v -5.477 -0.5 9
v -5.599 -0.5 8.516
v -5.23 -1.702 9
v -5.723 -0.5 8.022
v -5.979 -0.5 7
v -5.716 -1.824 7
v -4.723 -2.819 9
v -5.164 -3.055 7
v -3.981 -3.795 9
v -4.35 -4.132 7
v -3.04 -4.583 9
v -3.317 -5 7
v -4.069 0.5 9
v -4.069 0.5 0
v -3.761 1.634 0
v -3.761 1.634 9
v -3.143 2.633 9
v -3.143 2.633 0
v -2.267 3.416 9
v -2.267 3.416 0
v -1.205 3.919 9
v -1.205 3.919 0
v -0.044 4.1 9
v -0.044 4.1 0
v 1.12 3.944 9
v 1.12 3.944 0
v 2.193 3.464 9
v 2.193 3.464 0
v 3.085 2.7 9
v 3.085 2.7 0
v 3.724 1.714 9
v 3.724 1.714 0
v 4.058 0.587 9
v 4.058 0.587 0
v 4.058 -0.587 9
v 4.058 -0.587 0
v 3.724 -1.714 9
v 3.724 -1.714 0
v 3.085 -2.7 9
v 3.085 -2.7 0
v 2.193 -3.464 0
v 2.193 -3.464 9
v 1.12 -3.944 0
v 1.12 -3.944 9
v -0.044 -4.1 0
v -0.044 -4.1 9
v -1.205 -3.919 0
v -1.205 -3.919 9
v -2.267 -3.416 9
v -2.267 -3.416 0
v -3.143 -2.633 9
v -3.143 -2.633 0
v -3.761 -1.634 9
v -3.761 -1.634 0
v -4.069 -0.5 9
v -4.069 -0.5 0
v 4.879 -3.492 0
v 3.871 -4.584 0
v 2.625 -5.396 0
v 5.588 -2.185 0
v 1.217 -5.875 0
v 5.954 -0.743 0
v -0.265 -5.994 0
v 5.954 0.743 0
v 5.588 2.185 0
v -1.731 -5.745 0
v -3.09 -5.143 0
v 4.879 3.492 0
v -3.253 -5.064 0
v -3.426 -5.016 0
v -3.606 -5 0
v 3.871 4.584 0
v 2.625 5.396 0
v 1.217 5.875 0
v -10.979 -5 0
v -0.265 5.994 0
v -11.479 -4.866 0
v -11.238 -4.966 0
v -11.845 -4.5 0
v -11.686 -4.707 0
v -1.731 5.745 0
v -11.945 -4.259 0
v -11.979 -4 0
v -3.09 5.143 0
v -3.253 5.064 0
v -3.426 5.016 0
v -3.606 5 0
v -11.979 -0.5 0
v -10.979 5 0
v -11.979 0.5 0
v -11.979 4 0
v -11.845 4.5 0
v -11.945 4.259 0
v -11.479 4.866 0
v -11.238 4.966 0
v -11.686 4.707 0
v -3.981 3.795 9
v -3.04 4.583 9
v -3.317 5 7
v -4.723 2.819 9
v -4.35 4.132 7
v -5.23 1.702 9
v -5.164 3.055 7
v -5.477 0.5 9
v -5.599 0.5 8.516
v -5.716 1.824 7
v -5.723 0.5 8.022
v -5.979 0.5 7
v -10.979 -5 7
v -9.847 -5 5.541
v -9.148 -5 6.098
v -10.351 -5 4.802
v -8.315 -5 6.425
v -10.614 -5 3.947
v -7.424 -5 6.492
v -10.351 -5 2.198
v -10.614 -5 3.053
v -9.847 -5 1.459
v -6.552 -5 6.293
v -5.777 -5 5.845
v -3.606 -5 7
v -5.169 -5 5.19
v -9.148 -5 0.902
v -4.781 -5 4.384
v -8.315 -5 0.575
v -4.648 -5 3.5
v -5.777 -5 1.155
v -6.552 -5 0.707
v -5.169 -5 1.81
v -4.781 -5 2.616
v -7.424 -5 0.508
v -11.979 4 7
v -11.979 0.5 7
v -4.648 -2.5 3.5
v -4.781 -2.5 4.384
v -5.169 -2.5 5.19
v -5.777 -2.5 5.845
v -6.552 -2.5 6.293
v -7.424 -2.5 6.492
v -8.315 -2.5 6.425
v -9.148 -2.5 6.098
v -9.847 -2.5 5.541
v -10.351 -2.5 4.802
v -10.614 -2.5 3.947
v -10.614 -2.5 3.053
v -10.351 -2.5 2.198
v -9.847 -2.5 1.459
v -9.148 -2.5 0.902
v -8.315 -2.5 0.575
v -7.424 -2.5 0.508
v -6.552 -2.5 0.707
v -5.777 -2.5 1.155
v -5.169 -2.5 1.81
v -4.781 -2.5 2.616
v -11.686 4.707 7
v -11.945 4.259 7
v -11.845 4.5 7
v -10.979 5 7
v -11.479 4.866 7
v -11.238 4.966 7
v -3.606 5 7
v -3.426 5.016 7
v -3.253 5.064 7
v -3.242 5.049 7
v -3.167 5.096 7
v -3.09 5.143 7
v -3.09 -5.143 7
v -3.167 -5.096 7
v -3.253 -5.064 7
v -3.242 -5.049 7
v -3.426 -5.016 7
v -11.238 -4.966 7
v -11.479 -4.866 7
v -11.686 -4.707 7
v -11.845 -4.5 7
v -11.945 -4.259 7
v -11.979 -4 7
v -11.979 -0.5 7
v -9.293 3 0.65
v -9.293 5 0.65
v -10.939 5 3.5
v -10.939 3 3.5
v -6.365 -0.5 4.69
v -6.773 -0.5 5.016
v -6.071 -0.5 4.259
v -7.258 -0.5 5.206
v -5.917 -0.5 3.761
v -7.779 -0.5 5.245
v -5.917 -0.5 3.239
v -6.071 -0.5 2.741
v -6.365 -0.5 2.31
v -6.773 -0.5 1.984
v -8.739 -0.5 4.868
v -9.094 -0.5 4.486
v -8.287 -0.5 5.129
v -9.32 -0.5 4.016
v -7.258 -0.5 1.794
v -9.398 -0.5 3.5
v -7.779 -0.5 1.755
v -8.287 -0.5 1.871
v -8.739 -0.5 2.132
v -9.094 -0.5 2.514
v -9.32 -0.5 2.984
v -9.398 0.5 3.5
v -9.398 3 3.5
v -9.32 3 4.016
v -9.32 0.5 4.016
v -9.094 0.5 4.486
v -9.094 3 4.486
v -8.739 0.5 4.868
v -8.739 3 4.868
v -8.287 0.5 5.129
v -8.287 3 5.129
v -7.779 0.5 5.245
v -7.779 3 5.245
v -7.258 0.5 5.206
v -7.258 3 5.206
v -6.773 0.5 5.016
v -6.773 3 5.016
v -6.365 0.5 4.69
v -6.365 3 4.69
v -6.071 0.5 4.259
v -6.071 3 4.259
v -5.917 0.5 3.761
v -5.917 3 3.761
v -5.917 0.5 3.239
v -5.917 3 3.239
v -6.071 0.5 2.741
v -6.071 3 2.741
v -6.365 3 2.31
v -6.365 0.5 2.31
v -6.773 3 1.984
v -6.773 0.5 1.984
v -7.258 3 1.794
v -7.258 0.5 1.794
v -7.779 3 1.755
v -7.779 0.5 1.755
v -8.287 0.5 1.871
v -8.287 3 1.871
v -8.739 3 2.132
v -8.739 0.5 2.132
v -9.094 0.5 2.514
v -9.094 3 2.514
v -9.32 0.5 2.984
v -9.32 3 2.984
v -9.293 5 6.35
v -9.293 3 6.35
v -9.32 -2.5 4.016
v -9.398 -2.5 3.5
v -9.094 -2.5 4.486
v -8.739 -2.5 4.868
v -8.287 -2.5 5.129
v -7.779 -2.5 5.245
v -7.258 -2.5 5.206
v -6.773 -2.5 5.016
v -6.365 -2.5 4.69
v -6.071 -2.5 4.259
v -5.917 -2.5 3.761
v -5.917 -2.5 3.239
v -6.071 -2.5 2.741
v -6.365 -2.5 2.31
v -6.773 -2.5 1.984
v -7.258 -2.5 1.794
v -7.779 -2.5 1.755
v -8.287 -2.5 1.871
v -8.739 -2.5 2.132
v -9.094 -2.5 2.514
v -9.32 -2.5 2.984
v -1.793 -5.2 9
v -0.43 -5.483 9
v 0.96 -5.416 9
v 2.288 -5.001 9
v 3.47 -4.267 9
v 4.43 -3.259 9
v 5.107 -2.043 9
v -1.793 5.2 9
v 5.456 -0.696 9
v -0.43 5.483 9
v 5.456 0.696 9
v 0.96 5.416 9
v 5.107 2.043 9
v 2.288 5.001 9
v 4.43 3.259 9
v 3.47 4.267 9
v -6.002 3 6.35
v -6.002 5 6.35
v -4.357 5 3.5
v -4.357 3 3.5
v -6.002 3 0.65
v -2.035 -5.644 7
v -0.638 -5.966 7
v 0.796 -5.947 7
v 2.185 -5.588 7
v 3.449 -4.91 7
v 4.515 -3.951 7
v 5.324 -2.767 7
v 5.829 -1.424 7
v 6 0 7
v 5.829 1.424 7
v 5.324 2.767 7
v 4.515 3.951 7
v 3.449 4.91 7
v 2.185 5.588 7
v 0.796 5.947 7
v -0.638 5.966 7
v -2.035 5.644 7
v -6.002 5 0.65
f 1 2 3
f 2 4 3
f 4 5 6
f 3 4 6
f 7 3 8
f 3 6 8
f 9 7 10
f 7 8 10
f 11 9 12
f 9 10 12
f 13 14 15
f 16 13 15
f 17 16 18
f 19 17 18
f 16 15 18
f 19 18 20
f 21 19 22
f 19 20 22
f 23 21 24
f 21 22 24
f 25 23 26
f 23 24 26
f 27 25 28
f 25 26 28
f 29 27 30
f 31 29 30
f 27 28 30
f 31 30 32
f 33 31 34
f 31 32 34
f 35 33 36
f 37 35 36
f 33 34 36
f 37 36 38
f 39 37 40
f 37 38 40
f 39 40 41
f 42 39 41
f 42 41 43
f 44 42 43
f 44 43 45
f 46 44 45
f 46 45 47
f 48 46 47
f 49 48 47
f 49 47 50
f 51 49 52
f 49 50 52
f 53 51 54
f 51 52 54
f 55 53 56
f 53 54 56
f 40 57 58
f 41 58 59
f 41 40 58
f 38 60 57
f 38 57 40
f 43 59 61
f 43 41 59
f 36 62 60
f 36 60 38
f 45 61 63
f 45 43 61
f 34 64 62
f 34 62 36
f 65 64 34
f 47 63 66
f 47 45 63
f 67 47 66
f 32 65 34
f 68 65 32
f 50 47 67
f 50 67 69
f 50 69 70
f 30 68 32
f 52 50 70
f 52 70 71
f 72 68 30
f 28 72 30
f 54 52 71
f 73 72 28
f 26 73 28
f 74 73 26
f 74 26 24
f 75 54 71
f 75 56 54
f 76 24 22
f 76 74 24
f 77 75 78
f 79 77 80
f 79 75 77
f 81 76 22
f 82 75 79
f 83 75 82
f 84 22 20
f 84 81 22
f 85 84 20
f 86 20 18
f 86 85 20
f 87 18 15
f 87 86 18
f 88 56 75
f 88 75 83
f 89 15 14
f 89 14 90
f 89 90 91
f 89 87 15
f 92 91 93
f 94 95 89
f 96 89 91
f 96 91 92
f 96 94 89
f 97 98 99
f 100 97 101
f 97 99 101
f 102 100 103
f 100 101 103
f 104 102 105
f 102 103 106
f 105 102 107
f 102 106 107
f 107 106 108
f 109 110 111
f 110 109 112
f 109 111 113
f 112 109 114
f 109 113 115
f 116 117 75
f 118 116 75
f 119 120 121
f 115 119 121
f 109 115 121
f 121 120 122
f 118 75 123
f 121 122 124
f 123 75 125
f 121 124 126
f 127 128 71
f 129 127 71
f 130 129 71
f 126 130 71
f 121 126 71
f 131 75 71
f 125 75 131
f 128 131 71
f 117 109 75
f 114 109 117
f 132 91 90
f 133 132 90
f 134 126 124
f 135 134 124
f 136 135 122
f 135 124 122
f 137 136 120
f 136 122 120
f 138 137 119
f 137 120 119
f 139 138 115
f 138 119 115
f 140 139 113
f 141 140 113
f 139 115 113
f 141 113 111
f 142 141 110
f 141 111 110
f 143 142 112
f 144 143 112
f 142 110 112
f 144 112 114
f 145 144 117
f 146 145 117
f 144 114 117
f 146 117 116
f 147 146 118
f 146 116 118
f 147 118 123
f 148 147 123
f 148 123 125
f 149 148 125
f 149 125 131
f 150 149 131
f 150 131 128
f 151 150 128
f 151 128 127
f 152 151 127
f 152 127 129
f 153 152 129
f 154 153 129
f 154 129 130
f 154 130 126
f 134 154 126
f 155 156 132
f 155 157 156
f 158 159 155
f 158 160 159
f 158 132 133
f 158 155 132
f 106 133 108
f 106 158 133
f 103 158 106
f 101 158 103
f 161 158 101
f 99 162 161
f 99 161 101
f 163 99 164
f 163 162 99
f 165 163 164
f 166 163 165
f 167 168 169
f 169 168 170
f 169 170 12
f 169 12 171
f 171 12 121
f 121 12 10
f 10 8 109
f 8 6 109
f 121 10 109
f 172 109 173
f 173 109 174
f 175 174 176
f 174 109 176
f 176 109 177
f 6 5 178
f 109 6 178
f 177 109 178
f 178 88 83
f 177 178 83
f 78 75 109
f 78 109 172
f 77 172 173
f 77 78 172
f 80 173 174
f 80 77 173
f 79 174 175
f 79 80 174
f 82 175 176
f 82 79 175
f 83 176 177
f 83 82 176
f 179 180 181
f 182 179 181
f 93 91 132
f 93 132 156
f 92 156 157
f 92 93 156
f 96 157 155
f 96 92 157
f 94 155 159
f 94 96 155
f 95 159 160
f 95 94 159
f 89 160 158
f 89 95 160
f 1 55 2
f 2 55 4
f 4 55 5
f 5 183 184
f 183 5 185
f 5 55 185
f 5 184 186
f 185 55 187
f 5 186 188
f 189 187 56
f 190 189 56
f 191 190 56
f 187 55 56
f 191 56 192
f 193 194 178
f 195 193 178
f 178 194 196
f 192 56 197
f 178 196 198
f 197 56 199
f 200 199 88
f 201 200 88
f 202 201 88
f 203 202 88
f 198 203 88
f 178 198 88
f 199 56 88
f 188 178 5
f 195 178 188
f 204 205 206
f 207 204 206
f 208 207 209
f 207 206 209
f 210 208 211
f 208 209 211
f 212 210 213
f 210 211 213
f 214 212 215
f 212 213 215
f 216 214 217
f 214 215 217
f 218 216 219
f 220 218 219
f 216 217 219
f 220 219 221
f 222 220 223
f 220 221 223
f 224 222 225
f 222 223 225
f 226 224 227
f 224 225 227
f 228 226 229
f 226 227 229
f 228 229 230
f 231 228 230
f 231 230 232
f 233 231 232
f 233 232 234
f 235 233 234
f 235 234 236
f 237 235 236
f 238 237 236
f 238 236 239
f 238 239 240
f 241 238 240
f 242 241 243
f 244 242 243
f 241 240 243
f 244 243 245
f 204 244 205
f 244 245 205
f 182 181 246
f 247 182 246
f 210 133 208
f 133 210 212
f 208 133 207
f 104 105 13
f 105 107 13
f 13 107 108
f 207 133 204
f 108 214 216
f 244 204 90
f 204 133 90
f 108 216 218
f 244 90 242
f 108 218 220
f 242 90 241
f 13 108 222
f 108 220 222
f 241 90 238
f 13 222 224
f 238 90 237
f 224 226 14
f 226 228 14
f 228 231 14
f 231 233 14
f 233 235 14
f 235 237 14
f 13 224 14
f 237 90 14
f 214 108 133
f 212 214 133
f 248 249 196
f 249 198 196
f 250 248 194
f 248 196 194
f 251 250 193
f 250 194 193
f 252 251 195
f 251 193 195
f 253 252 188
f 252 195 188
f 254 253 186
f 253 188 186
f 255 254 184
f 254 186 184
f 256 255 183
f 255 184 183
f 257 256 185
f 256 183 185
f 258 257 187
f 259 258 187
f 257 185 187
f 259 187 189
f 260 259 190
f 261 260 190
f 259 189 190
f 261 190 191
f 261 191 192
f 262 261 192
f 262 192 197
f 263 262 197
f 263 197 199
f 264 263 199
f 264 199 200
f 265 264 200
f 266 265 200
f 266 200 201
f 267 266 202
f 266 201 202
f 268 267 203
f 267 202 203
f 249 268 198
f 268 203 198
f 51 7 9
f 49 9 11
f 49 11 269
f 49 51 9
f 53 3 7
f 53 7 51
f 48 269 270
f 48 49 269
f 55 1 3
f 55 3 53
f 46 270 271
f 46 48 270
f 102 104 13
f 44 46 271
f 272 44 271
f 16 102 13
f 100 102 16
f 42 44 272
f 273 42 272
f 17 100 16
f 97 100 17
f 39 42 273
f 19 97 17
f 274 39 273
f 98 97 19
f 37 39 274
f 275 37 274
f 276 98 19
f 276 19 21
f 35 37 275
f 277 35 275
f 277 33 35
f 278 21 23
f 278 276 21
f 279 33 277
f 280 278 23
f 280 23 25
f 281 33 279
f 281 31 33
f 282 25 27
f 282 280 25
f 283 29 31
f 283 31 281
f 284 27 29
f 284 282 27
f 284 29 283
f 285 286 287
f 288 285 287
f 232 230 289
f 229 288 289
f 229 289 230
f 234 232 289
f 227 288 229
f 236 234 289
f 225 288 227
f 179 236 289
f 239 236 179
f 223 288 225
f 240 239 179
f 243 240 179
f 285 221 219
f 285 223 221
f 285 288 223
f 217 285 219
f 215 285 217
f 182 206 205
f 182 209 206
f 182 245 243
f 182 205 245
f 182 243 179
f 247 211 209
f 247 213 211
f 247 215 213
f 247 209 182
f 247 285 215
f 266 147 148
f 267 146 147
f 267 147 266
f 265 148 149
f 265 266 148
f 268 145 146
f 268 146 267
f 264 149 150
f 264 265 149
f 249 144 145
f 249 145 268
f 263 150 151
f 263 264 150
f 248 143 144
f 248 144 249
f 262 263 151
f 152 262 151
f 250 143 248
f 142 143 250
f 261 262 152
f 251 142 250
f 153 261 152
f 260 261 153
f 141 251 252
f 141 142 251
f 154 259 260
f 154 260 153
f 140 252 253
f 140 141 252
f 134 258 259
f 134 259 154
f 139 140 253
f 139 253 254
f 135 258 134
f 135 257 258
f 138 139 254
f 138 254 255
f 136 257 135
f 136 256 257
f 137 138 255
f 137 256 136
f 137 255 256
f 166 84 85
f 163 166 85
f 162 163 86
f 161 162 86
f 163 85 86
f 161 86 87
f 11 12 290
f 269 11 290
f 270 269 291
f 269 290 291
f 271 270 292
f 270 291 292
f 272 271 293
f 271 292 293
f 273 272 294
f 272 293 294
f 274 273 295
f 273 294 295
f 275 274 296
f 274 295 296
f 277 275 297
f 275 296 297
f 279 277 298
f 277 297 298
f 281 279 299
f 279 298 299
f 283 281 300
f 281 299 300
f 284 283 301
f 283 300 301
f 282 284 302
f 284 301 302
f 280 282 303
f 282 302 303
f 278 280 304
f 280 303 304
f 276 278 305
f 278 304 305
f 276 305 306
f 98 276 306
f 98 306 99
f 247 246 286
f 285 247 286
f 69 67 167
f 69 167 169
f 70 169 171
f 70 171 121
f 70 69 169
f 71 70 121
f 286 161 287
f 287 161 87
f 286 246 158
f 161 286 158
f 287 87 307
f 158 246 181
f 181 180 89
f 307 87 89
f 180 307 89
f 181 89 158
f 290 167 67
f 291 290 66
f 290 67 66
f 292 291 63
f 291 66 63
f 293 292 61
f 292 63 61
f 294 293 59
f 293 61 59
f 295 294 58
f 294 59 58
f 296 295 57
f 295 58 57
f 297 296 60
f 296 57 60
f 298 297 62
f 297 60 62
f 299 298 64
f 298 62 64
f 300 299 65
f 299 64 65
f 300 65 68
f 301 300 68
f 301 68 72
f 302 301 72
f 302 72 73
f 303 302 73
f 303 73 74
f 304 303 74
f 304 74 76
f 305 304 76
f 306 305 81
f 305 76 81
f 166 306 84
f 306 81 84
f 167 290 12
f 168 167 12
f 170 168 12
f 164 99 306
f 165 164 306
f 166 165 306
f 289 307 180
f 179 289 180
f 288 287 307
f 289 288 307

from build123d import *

# Parameters (mm, degrees)
F1_DEPTH       = 9
F2_DEPTH       = 7
F7_D           = 3.5
F7_START       = 4.5
F7_CBORE_D     = 6
F7_CBORE_DEPTH = 2.5
F8_DEPTH       = 6.5
F9_SIZE2       = 1.99999
F9_SIZE        = 0.49999
F10_T1_DEPTH   = 7
F10_T3_DEPTH   = 7


# Not quite as in the source:
# - a fillet or chamfer that OpenCascade refuses, or shapes differently, is made with other operations: its cross-section is extruded or revolved along the edge and cut away or added
# - a fillet or chamfer is up to 0.001 mm smaller than in the source, because OpenCascade refuses the exact size


with BuildPart() as f1:
    # F0 (on Top) → F1 (new body)
    with BuildSketch(Plane.XY):
        with BuildLine():
            ThreePointArc((-4.0693979899, 0.5), (4.1, 0), (-4.0693979899, -0.5))
            Line((-4.0693979899, -0.5), (-5.9791303716, -0.5))
            ThreePointArc((-5.9791303716, -0.5), (-5.1638421749, -3.0552796914), (-3.3166247904, -5))
            ThreePointArc((-3.3166247904, -5), (6, 0), (-3.3166247904, 5))
            ThreePointArc((-3.3166247904, 5), (-5.1638421749, 3.0552796914), (-5.9791303716, 0.5))
            Line((-5.9791303716, 0.5), (-4.0693979899, 0.5))
        make_face()
    extrude(amount=F1_DEPTH)

    # F0 (on Top) → F2 (join)
    with BuildSketch(Plane.XY):
        with BuildLine():
            Line((-11.9791303716, 0.5), (-5.9791303716, 0.5))
            ThreePointArc((-5.9791303716, 0.5), (-5.1638421749, 3.0552796914), (-3.3166247904, 5))
            Line((-3.3166247904, 5), (-11.9791303716, 5))
            Line((-11.9791303716, 5), (-11.9791303716, 0.5))
        make_face()
        with BuildLine():
            ThreePointArc((-3.3166247904, -5), (-5.1638421749, -3.0552796914), (-5.9791303716, -0.5))
            Line((-5.9791303716, -0.5), (-11.9791303716, -0.5))
            Line((-11.9791303716, -0.5), (-11.9791303716, -5))
            Line((-11.9791303716, -5), (-3.3166247904, -5))
        make_face()
    extrude(amount=F2_DEPTH)

    # F7 (through all)
    # its depths count from where the whole tool has entered the part; down to there all is cleared
    with Locations(Plane.XZ.offset(9.5).offset(-F7_START)):
        with Locations((-7.647877581, 3.5)):
            CounterBoreHole(F7_D / 2, F7_CBORE_D / 2, F7_CBORE_DEPTH)

    # F6 (on offset) → F8 (cut)
    with BuildSketch(Plane(origin=(0, 9.5, 0), x_dir=(-1, 0, 0), z_dir=(0, 1, 0))):
        Polygon((6.0024293138, 0.65), (9.2933258481, 0.65), (10.9387741153, 3.5), (9.2933258481, 6.35), (6.0024293138, 6.35), (4.3569810466, 3.5), align=None)
    extrude(amount=-F8_DEPTH, mode=Mode.SUBTRACT)

    # F9 (size 0.5 and 2 in the source; OpenCascade refuses exactly that, so slightly less here)
    f9_edges = [f1.edges().sort_by_distance(p)[0] for p in [
        (5.400488, -2.614332, 9),
    ]]
    f9_side = f1.faces().sort_by_distance((-5.017914, 2.968938, 9))[0]
    chamfer(f9_edges, length=F9_SIZE, length2=F9_SIZE2, reference=f9_side)

    # F10: fillet of radius 1 on 4 edges, made by hand

    # F10_s2 → F10_t1 (join)
    with BuildSketch(Plane.XY):
        with BuildLine():
            ThreePointArc((-3.0904725218, -5.1428571429), (-3.3382900336, -5.0363758883), (-3.6055512755, -5))
            Line((-3.6055512755, -5), (-3.6055512755, -4.98))
            Line((-3.6055512755, -4.98), (-3.3166247904, -4.98))
            Line((-3.3166247904, -4.98), (-3.3055693744, -4.9833333333))
            ThreePointArc((-3.3055693744, -4.9833333333), (-3.1936637184, -5.0557800638), (-3.0801709468, -5.1257142857))
            Line((-3.0801709468, -5.1257142857), (-3.0904725218, -5.1428571429))
        make_face()
        with BuildLine():
            ThreePointArc((-3.0904725218, 5.1428571429), (-3.3382900336, 5.0363758883), (-3.6055512755, 5))
            Line((-3.6055512755, 5), (-3.6055512755, 4.98))
            Line((-3.6055512755, 4.98), (-3.3166247904, 4.98))
            Line((-3.3166247904, 4.98), (-3.3055693744, 4.9833333333))
            ThreePointArc((-3.3055693744, 4.9833333333), (-3.1936637184, 5.0557800638), (-3.0801709468, 5.1257142857))
            Line((-3.0801709468, 5.1257142857), (-3.0904725218, 5.1428571429))
        make_face()
    extrude(amount=F10_T1_DEPTH)

    # F10_s4 → F10_t3 (cut)
    with BuildSketch(Plane.XY):
        with BuildLine():
            ThreePointArc((-10.9791303716, -5), (-11.6862371527, -4.7071067812), (-11.9791303716, -4))
            Line((-11.9791303716, -4), (-11.9991303716, -4))
            Line((-11.9991303716, -4), (-11.9991303716, -5.02))
            Line((-11.9991303716, -5.02), (-10.9791303716, -5.02))
            Line((-10.9791303716, -5.02), (-10.9791303716, -5))
        make_face()
        with BuildLine():
            ThreePointArc((-11.9791303716, 4), (-11.6862371527, 4.7071067812), (-10.9791303716, 5))
            Line((-10.9791303716, 5), (-10.9791303716, 5.02))
            Line((-10.9791303716, 5.02), (-11.9991303716, 5.02))
            Line((-11.9991303716, 5.02), (-11.9991303716, 4))
            Line((-11.9991303716, 4), (-11.9791303716, 4))
        make_face()
    extrude(amount=F10_T3_DEPTH, mode=Mode.SUBTRACT)


solid = f1.part
